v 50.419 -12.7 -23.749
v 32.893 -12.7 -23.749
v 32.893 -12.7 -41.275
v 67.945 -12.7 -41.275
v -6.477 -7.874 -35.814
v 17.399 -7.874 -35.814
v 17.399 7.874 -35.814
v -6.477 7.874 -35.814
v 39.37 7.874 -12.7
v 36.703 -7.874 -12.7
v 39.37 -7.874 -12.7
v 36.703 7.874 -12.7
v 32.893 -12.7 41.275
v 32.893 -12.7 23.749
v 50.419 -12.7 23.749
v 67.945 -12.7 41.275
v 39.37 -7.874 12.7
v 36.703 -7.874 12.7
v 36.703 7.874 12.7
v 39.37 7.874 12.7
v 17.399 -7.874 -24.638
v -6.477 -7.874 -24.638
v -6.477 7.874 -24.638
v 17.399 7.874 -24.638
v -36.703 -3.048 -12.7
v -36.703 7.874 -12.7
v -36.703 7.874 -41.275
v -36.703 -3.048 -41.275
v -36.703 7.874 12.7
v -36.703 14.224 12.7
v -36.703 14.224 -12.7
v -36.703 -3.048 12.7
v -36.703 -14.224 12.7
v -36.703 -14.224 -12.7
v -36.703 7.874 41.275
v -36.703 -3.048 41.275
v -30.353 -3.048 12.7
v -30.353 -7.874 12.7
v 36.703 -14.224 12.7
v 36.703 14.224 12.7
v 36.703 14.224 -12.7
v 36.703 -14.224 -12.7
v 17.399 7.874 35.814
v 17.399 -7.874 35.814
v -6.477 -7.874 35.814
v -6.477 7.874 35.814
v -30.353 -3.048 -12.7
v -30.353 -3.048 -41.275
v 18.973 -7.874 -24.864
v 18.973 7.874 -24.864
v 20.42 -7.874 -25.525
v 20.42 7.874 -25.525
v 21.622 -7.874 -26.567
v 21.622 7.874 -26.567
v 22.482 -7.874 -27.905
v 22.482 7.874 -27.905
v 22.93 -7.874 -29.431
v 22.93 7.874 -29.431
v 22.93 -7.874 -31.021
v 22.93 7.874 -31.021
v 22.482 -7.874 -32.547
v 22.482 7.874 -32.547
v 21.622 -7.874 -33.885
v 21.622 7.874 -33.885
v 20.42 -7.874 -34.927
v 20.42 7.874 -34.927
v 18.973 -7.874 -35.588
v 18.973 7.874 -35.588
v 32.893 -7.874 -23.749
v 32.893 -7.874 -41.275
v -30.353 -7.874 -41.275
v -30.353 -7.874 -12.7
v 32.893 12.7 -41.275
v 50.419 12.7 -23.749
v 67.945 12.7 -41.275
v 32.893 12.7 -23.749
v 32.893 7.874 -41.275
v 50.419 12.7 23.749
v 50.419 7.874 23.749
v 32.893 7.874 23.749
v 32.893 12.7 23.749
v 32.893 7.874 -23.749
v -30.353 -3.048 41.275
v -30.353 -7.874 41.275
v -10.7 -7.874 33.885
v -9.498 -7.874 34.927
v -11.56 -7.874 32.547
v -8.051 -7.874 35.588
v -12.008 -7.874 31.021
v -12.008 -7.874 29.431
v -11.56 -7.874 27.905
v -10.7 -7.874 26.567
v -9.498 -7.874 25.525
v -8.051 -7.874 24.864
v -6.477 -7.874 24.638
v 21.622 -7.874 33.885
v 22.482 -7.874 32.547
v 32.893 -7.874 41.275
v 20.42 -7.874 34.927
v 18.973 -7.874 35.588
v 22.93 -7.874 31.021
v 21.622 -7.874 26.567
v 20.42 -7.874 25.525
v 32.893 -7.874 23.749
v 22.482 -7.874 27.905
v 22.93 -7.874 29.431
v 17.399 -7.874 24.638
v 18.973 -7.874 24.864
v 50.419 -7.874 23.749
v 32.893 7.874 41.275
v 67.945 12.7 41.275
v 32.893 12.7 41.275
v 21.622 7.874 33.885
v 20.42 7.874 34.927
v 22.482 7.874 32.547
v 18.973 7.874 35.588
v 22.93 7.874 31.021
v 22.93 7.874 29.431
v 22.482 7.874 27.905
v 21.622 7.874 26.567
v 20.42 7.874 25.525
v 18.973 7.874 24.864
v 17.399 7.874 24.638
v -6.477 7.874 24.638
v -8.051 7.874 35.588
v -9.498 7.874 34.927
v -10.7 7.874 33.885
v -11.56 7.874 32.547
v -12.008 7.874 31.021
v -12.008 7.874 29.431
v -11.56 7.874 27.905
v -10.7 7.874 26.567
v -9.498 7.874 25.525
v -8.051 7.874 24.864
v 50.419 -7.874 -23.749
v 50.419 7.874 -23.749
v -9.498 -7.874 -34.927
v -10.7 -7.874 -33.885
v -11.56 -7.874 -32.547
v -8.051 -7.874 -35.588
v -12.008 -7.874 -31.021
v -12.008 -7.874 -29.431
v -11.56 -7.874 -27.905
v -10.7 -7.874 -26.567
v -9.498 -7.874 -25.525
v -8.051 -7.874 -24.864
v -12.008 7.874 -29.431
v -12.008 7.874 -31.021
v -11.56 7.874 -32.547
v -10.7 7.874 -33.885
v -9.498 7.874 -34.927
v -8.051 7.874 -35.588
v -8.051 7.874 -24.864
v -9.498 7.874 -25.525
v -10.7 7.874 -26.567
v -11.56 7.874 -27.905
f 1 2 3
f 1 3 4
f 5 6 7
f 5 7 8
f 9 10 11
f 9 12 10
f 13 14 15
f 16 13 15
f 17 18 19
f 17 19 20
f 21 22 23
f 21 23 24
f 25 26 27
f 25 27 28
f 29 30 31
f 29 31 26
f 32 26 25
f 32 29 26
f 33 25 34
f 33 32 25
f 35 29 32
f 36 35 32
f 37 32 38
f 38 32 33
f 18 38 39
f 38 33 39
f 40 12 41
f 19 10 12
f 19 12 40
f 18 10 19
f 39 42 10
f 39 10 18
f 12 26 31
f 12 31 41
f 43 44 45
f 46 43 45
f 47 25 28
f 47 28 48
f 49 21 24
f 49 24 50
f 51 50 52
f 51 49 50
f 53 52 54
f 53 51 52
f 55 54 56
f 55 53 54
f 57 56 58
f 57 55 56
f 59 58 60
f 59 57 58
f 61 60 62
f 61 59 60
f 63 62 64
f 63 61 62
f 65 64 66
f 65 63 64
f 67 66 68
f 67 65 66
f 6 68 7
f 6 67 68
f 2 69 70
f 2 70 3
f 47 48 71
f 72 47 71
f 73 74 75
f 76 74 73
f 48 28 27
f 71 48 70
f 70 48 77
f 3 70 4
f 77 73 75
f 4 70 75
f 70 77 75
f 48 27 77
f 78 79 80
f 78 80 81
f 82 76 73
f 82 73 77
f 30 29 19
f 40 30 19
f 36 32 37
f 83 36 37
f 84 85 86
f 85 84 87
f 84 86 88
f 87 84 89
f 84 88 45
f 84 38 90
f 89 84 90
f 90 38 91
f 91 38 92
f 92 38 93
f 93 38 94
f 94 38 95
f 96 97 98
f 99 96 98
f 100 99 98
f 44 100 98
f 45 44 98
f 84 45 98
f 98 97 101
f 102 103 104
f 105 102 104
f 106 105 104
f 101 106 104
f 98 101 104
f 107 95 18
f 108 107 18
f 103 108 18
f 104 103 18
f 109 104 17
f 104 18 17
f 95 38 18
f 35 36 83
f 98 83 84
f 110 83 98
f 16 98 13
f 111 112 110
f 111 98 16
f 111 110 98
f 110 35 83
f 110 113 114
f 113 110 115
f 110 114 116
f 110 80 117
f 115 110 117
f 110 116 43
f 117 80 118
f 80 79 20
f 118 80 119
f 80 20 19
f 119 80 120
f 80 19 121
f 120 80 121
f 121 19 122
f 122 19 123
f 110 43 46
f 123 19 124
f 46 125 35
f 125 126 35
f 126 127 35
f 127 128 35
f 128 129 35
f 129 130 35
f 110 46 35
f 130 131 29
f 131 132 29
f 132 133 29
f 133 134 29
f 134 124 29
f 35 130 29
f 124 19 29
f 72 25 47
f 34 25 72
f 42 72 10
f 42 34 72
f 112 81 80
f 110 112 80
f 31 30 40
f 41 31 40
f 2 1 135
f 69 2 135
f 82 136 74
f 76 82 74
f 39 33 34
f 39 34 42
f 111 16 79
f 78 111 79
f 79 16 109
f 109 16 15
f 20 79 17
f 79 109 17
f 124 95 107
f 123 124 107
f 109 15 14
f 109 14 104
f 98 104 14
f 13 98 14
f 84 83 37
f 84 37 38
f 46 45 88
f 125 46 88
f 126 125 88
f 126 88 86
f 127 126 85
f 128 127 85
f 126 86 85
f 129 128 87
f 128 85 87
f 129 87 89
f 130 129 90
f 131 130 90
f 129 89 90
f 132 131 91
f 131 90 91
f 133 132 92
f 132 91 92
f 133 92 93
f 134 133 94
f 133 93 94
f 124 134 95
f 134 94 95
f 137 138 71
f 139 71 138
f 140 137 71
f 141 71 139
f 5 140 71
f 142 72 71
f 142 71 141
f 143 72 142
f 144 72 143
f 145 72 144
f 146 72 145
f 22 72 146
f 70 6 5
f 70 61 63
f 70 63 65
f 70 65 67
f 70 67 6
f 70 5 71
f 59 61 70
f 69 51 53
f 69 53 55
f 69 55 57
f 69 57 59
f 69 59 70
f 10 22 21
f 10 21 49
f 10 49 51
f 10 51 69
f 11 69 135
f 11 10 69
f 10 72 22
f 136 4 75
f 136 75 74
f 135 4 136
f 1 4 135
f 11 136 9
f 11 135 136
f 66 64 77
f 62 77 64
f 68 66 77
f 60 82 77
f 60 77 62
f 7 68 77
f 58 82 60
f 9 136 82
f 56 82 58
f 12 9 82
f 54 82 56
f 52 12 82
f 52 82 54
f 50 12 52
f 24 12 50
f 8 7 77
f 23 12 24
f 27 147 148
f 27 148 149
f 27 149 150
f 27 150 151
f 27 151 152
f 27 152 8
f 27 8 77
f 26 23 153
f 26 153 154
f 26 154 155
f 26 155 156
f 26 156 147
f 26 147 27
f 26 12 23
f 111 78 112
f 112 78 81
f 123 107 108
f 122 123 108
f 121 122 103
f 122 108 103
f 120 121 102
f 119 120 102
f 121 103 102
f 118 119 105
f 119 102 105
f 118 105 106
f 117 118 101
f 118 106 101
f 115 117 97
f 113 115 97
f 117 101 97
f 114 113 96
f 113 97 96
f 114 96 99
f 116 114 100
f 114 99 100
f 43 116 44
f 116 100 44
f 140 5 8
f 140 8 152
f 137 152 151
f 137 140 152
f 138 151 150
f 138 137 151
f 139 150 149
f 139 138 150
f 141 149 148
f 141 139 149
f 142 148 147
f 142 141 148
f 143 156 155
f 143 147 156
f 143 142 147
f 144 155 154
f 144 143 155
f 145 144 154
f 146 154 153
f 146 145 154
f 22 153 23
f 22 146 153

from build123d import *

# Parameters (mm, degrees)
F0_W     = 73.406
F0_H     = 25.4
F1_DEPTH = 14.224
F2_W     = 31.242
F2_H     = 25.4
F3_DEPTH = 28.575
F5_DEPTH = 22.099
F6_W     = 4.826
F6_H     = 11.049
F7_DEPTH = 104.649
F9_DEPTH = 26.925


# Not quite as in the source:
# - a pattern or mirror of a feature is missing from the dataset's text; its kind, count and spacing are read off the source's solid


with BuildPart() as f1:
    # F0 (on Front) → F1 (new body, symmetric)
    with BuildSketch(Plane.XZ):
        Rectangle(F0_W, F0_H)
    extrude(amount=F1_DEPTH, both=True)

    # F2 (on face) → F3 (join)
    with BuildSketch(Plane.XY.offset(12.7)):
        Polygon((-36.703, 7.874), (-36.703, -3.048), (-30.353, -3.048), (-30.353, -7.874), (32.893, -7.874), (32.893, -12.7), (36.703, -12.7), (36.703, 12.7), (32.893, 12.7), (32.893, 7.874), align=None)
        with Locations((52.324, 0)):
            Rectangle(F2_W, F2_H)
    f3 = extrude(amount=F3_DEPTH)

    # F3_copies: F3 across plane
    add(f3.mirror(Plane(origin=(0, 0, 0), x_dir=(-1, 0, 0), z_dir=(0, 0, -1))))

    # F4 (on face) → F5 (cut, through all)
    with BuildSketch(Plane.XZ.offset(7.874)):
        with BuildLine():
            ThreePointArc((-6.477, 35.814), (-12.065, 30.226), (-6.477, 24.638))
            Line((-6.477, 24.638), (17.399, 24.638))
            ThreePointArc((17.399, 24.638), (22.987, 30.226), (17.399, 35.814))
            Line((17.399, 35.814), (-6.477, 35.814))
        make_face()
    f5 = extrude(amount=-F5_DEPTH, mode=Mode.SUBTRACT)

    # F5_copies: F5 across plane
    add(f5.mirror(Plane(origin=(0, 0, 0), x_dir=(-1, 0, 0), z_dir=(0, 0, -1))), mode=Mode.SUBTRACT)

    # F6 (on face) → F7 (cut, through all)
    with BuildSketch(Plane.YZ.offset(67.945)):
        with Locations((-10.287, 18.2245)):
            Rectangle(F6_W, F6_H)
        with Locations((10.287, 18.2245)):
            Rectangle(F6_W, F6_H)
    f7 = extrude(amount=-F7_DEPTH, mode=Mode.SUBTRACT)

    # F7_copies: F7 across plane
    add(f7.mirror(Plane(origin=(0, 0, 0), x_dir=(-1, 0, 0), z_dir=(0, 0, -1))), mode=Mode.SUBTRACT)

    # F8 (on face) → F9 (cut, through all)
    with BuildSketch(Plane.XZ.offset(12.7)):
        Polygon((67.945, 41.275), (50.419, 23.749), (67.945, 23.749), align=None)
        Polygon((50.419, 23.749), (39.37, 12.7), (67.945, 12.7), (67.945, 23.749), align=None)
    f9 = extrude(amount=-F9_DEPTH, mode=Mode.SUBTRACT)

    # F9_copies: F9 across plane
    add(f9.mirror(Plane(origin=(0, 0, 0), x_dir=(-1, 0, 0), z_dir=(0, 0, -1))), mode=Mode.SUBTRACT)


solid = f1.part
